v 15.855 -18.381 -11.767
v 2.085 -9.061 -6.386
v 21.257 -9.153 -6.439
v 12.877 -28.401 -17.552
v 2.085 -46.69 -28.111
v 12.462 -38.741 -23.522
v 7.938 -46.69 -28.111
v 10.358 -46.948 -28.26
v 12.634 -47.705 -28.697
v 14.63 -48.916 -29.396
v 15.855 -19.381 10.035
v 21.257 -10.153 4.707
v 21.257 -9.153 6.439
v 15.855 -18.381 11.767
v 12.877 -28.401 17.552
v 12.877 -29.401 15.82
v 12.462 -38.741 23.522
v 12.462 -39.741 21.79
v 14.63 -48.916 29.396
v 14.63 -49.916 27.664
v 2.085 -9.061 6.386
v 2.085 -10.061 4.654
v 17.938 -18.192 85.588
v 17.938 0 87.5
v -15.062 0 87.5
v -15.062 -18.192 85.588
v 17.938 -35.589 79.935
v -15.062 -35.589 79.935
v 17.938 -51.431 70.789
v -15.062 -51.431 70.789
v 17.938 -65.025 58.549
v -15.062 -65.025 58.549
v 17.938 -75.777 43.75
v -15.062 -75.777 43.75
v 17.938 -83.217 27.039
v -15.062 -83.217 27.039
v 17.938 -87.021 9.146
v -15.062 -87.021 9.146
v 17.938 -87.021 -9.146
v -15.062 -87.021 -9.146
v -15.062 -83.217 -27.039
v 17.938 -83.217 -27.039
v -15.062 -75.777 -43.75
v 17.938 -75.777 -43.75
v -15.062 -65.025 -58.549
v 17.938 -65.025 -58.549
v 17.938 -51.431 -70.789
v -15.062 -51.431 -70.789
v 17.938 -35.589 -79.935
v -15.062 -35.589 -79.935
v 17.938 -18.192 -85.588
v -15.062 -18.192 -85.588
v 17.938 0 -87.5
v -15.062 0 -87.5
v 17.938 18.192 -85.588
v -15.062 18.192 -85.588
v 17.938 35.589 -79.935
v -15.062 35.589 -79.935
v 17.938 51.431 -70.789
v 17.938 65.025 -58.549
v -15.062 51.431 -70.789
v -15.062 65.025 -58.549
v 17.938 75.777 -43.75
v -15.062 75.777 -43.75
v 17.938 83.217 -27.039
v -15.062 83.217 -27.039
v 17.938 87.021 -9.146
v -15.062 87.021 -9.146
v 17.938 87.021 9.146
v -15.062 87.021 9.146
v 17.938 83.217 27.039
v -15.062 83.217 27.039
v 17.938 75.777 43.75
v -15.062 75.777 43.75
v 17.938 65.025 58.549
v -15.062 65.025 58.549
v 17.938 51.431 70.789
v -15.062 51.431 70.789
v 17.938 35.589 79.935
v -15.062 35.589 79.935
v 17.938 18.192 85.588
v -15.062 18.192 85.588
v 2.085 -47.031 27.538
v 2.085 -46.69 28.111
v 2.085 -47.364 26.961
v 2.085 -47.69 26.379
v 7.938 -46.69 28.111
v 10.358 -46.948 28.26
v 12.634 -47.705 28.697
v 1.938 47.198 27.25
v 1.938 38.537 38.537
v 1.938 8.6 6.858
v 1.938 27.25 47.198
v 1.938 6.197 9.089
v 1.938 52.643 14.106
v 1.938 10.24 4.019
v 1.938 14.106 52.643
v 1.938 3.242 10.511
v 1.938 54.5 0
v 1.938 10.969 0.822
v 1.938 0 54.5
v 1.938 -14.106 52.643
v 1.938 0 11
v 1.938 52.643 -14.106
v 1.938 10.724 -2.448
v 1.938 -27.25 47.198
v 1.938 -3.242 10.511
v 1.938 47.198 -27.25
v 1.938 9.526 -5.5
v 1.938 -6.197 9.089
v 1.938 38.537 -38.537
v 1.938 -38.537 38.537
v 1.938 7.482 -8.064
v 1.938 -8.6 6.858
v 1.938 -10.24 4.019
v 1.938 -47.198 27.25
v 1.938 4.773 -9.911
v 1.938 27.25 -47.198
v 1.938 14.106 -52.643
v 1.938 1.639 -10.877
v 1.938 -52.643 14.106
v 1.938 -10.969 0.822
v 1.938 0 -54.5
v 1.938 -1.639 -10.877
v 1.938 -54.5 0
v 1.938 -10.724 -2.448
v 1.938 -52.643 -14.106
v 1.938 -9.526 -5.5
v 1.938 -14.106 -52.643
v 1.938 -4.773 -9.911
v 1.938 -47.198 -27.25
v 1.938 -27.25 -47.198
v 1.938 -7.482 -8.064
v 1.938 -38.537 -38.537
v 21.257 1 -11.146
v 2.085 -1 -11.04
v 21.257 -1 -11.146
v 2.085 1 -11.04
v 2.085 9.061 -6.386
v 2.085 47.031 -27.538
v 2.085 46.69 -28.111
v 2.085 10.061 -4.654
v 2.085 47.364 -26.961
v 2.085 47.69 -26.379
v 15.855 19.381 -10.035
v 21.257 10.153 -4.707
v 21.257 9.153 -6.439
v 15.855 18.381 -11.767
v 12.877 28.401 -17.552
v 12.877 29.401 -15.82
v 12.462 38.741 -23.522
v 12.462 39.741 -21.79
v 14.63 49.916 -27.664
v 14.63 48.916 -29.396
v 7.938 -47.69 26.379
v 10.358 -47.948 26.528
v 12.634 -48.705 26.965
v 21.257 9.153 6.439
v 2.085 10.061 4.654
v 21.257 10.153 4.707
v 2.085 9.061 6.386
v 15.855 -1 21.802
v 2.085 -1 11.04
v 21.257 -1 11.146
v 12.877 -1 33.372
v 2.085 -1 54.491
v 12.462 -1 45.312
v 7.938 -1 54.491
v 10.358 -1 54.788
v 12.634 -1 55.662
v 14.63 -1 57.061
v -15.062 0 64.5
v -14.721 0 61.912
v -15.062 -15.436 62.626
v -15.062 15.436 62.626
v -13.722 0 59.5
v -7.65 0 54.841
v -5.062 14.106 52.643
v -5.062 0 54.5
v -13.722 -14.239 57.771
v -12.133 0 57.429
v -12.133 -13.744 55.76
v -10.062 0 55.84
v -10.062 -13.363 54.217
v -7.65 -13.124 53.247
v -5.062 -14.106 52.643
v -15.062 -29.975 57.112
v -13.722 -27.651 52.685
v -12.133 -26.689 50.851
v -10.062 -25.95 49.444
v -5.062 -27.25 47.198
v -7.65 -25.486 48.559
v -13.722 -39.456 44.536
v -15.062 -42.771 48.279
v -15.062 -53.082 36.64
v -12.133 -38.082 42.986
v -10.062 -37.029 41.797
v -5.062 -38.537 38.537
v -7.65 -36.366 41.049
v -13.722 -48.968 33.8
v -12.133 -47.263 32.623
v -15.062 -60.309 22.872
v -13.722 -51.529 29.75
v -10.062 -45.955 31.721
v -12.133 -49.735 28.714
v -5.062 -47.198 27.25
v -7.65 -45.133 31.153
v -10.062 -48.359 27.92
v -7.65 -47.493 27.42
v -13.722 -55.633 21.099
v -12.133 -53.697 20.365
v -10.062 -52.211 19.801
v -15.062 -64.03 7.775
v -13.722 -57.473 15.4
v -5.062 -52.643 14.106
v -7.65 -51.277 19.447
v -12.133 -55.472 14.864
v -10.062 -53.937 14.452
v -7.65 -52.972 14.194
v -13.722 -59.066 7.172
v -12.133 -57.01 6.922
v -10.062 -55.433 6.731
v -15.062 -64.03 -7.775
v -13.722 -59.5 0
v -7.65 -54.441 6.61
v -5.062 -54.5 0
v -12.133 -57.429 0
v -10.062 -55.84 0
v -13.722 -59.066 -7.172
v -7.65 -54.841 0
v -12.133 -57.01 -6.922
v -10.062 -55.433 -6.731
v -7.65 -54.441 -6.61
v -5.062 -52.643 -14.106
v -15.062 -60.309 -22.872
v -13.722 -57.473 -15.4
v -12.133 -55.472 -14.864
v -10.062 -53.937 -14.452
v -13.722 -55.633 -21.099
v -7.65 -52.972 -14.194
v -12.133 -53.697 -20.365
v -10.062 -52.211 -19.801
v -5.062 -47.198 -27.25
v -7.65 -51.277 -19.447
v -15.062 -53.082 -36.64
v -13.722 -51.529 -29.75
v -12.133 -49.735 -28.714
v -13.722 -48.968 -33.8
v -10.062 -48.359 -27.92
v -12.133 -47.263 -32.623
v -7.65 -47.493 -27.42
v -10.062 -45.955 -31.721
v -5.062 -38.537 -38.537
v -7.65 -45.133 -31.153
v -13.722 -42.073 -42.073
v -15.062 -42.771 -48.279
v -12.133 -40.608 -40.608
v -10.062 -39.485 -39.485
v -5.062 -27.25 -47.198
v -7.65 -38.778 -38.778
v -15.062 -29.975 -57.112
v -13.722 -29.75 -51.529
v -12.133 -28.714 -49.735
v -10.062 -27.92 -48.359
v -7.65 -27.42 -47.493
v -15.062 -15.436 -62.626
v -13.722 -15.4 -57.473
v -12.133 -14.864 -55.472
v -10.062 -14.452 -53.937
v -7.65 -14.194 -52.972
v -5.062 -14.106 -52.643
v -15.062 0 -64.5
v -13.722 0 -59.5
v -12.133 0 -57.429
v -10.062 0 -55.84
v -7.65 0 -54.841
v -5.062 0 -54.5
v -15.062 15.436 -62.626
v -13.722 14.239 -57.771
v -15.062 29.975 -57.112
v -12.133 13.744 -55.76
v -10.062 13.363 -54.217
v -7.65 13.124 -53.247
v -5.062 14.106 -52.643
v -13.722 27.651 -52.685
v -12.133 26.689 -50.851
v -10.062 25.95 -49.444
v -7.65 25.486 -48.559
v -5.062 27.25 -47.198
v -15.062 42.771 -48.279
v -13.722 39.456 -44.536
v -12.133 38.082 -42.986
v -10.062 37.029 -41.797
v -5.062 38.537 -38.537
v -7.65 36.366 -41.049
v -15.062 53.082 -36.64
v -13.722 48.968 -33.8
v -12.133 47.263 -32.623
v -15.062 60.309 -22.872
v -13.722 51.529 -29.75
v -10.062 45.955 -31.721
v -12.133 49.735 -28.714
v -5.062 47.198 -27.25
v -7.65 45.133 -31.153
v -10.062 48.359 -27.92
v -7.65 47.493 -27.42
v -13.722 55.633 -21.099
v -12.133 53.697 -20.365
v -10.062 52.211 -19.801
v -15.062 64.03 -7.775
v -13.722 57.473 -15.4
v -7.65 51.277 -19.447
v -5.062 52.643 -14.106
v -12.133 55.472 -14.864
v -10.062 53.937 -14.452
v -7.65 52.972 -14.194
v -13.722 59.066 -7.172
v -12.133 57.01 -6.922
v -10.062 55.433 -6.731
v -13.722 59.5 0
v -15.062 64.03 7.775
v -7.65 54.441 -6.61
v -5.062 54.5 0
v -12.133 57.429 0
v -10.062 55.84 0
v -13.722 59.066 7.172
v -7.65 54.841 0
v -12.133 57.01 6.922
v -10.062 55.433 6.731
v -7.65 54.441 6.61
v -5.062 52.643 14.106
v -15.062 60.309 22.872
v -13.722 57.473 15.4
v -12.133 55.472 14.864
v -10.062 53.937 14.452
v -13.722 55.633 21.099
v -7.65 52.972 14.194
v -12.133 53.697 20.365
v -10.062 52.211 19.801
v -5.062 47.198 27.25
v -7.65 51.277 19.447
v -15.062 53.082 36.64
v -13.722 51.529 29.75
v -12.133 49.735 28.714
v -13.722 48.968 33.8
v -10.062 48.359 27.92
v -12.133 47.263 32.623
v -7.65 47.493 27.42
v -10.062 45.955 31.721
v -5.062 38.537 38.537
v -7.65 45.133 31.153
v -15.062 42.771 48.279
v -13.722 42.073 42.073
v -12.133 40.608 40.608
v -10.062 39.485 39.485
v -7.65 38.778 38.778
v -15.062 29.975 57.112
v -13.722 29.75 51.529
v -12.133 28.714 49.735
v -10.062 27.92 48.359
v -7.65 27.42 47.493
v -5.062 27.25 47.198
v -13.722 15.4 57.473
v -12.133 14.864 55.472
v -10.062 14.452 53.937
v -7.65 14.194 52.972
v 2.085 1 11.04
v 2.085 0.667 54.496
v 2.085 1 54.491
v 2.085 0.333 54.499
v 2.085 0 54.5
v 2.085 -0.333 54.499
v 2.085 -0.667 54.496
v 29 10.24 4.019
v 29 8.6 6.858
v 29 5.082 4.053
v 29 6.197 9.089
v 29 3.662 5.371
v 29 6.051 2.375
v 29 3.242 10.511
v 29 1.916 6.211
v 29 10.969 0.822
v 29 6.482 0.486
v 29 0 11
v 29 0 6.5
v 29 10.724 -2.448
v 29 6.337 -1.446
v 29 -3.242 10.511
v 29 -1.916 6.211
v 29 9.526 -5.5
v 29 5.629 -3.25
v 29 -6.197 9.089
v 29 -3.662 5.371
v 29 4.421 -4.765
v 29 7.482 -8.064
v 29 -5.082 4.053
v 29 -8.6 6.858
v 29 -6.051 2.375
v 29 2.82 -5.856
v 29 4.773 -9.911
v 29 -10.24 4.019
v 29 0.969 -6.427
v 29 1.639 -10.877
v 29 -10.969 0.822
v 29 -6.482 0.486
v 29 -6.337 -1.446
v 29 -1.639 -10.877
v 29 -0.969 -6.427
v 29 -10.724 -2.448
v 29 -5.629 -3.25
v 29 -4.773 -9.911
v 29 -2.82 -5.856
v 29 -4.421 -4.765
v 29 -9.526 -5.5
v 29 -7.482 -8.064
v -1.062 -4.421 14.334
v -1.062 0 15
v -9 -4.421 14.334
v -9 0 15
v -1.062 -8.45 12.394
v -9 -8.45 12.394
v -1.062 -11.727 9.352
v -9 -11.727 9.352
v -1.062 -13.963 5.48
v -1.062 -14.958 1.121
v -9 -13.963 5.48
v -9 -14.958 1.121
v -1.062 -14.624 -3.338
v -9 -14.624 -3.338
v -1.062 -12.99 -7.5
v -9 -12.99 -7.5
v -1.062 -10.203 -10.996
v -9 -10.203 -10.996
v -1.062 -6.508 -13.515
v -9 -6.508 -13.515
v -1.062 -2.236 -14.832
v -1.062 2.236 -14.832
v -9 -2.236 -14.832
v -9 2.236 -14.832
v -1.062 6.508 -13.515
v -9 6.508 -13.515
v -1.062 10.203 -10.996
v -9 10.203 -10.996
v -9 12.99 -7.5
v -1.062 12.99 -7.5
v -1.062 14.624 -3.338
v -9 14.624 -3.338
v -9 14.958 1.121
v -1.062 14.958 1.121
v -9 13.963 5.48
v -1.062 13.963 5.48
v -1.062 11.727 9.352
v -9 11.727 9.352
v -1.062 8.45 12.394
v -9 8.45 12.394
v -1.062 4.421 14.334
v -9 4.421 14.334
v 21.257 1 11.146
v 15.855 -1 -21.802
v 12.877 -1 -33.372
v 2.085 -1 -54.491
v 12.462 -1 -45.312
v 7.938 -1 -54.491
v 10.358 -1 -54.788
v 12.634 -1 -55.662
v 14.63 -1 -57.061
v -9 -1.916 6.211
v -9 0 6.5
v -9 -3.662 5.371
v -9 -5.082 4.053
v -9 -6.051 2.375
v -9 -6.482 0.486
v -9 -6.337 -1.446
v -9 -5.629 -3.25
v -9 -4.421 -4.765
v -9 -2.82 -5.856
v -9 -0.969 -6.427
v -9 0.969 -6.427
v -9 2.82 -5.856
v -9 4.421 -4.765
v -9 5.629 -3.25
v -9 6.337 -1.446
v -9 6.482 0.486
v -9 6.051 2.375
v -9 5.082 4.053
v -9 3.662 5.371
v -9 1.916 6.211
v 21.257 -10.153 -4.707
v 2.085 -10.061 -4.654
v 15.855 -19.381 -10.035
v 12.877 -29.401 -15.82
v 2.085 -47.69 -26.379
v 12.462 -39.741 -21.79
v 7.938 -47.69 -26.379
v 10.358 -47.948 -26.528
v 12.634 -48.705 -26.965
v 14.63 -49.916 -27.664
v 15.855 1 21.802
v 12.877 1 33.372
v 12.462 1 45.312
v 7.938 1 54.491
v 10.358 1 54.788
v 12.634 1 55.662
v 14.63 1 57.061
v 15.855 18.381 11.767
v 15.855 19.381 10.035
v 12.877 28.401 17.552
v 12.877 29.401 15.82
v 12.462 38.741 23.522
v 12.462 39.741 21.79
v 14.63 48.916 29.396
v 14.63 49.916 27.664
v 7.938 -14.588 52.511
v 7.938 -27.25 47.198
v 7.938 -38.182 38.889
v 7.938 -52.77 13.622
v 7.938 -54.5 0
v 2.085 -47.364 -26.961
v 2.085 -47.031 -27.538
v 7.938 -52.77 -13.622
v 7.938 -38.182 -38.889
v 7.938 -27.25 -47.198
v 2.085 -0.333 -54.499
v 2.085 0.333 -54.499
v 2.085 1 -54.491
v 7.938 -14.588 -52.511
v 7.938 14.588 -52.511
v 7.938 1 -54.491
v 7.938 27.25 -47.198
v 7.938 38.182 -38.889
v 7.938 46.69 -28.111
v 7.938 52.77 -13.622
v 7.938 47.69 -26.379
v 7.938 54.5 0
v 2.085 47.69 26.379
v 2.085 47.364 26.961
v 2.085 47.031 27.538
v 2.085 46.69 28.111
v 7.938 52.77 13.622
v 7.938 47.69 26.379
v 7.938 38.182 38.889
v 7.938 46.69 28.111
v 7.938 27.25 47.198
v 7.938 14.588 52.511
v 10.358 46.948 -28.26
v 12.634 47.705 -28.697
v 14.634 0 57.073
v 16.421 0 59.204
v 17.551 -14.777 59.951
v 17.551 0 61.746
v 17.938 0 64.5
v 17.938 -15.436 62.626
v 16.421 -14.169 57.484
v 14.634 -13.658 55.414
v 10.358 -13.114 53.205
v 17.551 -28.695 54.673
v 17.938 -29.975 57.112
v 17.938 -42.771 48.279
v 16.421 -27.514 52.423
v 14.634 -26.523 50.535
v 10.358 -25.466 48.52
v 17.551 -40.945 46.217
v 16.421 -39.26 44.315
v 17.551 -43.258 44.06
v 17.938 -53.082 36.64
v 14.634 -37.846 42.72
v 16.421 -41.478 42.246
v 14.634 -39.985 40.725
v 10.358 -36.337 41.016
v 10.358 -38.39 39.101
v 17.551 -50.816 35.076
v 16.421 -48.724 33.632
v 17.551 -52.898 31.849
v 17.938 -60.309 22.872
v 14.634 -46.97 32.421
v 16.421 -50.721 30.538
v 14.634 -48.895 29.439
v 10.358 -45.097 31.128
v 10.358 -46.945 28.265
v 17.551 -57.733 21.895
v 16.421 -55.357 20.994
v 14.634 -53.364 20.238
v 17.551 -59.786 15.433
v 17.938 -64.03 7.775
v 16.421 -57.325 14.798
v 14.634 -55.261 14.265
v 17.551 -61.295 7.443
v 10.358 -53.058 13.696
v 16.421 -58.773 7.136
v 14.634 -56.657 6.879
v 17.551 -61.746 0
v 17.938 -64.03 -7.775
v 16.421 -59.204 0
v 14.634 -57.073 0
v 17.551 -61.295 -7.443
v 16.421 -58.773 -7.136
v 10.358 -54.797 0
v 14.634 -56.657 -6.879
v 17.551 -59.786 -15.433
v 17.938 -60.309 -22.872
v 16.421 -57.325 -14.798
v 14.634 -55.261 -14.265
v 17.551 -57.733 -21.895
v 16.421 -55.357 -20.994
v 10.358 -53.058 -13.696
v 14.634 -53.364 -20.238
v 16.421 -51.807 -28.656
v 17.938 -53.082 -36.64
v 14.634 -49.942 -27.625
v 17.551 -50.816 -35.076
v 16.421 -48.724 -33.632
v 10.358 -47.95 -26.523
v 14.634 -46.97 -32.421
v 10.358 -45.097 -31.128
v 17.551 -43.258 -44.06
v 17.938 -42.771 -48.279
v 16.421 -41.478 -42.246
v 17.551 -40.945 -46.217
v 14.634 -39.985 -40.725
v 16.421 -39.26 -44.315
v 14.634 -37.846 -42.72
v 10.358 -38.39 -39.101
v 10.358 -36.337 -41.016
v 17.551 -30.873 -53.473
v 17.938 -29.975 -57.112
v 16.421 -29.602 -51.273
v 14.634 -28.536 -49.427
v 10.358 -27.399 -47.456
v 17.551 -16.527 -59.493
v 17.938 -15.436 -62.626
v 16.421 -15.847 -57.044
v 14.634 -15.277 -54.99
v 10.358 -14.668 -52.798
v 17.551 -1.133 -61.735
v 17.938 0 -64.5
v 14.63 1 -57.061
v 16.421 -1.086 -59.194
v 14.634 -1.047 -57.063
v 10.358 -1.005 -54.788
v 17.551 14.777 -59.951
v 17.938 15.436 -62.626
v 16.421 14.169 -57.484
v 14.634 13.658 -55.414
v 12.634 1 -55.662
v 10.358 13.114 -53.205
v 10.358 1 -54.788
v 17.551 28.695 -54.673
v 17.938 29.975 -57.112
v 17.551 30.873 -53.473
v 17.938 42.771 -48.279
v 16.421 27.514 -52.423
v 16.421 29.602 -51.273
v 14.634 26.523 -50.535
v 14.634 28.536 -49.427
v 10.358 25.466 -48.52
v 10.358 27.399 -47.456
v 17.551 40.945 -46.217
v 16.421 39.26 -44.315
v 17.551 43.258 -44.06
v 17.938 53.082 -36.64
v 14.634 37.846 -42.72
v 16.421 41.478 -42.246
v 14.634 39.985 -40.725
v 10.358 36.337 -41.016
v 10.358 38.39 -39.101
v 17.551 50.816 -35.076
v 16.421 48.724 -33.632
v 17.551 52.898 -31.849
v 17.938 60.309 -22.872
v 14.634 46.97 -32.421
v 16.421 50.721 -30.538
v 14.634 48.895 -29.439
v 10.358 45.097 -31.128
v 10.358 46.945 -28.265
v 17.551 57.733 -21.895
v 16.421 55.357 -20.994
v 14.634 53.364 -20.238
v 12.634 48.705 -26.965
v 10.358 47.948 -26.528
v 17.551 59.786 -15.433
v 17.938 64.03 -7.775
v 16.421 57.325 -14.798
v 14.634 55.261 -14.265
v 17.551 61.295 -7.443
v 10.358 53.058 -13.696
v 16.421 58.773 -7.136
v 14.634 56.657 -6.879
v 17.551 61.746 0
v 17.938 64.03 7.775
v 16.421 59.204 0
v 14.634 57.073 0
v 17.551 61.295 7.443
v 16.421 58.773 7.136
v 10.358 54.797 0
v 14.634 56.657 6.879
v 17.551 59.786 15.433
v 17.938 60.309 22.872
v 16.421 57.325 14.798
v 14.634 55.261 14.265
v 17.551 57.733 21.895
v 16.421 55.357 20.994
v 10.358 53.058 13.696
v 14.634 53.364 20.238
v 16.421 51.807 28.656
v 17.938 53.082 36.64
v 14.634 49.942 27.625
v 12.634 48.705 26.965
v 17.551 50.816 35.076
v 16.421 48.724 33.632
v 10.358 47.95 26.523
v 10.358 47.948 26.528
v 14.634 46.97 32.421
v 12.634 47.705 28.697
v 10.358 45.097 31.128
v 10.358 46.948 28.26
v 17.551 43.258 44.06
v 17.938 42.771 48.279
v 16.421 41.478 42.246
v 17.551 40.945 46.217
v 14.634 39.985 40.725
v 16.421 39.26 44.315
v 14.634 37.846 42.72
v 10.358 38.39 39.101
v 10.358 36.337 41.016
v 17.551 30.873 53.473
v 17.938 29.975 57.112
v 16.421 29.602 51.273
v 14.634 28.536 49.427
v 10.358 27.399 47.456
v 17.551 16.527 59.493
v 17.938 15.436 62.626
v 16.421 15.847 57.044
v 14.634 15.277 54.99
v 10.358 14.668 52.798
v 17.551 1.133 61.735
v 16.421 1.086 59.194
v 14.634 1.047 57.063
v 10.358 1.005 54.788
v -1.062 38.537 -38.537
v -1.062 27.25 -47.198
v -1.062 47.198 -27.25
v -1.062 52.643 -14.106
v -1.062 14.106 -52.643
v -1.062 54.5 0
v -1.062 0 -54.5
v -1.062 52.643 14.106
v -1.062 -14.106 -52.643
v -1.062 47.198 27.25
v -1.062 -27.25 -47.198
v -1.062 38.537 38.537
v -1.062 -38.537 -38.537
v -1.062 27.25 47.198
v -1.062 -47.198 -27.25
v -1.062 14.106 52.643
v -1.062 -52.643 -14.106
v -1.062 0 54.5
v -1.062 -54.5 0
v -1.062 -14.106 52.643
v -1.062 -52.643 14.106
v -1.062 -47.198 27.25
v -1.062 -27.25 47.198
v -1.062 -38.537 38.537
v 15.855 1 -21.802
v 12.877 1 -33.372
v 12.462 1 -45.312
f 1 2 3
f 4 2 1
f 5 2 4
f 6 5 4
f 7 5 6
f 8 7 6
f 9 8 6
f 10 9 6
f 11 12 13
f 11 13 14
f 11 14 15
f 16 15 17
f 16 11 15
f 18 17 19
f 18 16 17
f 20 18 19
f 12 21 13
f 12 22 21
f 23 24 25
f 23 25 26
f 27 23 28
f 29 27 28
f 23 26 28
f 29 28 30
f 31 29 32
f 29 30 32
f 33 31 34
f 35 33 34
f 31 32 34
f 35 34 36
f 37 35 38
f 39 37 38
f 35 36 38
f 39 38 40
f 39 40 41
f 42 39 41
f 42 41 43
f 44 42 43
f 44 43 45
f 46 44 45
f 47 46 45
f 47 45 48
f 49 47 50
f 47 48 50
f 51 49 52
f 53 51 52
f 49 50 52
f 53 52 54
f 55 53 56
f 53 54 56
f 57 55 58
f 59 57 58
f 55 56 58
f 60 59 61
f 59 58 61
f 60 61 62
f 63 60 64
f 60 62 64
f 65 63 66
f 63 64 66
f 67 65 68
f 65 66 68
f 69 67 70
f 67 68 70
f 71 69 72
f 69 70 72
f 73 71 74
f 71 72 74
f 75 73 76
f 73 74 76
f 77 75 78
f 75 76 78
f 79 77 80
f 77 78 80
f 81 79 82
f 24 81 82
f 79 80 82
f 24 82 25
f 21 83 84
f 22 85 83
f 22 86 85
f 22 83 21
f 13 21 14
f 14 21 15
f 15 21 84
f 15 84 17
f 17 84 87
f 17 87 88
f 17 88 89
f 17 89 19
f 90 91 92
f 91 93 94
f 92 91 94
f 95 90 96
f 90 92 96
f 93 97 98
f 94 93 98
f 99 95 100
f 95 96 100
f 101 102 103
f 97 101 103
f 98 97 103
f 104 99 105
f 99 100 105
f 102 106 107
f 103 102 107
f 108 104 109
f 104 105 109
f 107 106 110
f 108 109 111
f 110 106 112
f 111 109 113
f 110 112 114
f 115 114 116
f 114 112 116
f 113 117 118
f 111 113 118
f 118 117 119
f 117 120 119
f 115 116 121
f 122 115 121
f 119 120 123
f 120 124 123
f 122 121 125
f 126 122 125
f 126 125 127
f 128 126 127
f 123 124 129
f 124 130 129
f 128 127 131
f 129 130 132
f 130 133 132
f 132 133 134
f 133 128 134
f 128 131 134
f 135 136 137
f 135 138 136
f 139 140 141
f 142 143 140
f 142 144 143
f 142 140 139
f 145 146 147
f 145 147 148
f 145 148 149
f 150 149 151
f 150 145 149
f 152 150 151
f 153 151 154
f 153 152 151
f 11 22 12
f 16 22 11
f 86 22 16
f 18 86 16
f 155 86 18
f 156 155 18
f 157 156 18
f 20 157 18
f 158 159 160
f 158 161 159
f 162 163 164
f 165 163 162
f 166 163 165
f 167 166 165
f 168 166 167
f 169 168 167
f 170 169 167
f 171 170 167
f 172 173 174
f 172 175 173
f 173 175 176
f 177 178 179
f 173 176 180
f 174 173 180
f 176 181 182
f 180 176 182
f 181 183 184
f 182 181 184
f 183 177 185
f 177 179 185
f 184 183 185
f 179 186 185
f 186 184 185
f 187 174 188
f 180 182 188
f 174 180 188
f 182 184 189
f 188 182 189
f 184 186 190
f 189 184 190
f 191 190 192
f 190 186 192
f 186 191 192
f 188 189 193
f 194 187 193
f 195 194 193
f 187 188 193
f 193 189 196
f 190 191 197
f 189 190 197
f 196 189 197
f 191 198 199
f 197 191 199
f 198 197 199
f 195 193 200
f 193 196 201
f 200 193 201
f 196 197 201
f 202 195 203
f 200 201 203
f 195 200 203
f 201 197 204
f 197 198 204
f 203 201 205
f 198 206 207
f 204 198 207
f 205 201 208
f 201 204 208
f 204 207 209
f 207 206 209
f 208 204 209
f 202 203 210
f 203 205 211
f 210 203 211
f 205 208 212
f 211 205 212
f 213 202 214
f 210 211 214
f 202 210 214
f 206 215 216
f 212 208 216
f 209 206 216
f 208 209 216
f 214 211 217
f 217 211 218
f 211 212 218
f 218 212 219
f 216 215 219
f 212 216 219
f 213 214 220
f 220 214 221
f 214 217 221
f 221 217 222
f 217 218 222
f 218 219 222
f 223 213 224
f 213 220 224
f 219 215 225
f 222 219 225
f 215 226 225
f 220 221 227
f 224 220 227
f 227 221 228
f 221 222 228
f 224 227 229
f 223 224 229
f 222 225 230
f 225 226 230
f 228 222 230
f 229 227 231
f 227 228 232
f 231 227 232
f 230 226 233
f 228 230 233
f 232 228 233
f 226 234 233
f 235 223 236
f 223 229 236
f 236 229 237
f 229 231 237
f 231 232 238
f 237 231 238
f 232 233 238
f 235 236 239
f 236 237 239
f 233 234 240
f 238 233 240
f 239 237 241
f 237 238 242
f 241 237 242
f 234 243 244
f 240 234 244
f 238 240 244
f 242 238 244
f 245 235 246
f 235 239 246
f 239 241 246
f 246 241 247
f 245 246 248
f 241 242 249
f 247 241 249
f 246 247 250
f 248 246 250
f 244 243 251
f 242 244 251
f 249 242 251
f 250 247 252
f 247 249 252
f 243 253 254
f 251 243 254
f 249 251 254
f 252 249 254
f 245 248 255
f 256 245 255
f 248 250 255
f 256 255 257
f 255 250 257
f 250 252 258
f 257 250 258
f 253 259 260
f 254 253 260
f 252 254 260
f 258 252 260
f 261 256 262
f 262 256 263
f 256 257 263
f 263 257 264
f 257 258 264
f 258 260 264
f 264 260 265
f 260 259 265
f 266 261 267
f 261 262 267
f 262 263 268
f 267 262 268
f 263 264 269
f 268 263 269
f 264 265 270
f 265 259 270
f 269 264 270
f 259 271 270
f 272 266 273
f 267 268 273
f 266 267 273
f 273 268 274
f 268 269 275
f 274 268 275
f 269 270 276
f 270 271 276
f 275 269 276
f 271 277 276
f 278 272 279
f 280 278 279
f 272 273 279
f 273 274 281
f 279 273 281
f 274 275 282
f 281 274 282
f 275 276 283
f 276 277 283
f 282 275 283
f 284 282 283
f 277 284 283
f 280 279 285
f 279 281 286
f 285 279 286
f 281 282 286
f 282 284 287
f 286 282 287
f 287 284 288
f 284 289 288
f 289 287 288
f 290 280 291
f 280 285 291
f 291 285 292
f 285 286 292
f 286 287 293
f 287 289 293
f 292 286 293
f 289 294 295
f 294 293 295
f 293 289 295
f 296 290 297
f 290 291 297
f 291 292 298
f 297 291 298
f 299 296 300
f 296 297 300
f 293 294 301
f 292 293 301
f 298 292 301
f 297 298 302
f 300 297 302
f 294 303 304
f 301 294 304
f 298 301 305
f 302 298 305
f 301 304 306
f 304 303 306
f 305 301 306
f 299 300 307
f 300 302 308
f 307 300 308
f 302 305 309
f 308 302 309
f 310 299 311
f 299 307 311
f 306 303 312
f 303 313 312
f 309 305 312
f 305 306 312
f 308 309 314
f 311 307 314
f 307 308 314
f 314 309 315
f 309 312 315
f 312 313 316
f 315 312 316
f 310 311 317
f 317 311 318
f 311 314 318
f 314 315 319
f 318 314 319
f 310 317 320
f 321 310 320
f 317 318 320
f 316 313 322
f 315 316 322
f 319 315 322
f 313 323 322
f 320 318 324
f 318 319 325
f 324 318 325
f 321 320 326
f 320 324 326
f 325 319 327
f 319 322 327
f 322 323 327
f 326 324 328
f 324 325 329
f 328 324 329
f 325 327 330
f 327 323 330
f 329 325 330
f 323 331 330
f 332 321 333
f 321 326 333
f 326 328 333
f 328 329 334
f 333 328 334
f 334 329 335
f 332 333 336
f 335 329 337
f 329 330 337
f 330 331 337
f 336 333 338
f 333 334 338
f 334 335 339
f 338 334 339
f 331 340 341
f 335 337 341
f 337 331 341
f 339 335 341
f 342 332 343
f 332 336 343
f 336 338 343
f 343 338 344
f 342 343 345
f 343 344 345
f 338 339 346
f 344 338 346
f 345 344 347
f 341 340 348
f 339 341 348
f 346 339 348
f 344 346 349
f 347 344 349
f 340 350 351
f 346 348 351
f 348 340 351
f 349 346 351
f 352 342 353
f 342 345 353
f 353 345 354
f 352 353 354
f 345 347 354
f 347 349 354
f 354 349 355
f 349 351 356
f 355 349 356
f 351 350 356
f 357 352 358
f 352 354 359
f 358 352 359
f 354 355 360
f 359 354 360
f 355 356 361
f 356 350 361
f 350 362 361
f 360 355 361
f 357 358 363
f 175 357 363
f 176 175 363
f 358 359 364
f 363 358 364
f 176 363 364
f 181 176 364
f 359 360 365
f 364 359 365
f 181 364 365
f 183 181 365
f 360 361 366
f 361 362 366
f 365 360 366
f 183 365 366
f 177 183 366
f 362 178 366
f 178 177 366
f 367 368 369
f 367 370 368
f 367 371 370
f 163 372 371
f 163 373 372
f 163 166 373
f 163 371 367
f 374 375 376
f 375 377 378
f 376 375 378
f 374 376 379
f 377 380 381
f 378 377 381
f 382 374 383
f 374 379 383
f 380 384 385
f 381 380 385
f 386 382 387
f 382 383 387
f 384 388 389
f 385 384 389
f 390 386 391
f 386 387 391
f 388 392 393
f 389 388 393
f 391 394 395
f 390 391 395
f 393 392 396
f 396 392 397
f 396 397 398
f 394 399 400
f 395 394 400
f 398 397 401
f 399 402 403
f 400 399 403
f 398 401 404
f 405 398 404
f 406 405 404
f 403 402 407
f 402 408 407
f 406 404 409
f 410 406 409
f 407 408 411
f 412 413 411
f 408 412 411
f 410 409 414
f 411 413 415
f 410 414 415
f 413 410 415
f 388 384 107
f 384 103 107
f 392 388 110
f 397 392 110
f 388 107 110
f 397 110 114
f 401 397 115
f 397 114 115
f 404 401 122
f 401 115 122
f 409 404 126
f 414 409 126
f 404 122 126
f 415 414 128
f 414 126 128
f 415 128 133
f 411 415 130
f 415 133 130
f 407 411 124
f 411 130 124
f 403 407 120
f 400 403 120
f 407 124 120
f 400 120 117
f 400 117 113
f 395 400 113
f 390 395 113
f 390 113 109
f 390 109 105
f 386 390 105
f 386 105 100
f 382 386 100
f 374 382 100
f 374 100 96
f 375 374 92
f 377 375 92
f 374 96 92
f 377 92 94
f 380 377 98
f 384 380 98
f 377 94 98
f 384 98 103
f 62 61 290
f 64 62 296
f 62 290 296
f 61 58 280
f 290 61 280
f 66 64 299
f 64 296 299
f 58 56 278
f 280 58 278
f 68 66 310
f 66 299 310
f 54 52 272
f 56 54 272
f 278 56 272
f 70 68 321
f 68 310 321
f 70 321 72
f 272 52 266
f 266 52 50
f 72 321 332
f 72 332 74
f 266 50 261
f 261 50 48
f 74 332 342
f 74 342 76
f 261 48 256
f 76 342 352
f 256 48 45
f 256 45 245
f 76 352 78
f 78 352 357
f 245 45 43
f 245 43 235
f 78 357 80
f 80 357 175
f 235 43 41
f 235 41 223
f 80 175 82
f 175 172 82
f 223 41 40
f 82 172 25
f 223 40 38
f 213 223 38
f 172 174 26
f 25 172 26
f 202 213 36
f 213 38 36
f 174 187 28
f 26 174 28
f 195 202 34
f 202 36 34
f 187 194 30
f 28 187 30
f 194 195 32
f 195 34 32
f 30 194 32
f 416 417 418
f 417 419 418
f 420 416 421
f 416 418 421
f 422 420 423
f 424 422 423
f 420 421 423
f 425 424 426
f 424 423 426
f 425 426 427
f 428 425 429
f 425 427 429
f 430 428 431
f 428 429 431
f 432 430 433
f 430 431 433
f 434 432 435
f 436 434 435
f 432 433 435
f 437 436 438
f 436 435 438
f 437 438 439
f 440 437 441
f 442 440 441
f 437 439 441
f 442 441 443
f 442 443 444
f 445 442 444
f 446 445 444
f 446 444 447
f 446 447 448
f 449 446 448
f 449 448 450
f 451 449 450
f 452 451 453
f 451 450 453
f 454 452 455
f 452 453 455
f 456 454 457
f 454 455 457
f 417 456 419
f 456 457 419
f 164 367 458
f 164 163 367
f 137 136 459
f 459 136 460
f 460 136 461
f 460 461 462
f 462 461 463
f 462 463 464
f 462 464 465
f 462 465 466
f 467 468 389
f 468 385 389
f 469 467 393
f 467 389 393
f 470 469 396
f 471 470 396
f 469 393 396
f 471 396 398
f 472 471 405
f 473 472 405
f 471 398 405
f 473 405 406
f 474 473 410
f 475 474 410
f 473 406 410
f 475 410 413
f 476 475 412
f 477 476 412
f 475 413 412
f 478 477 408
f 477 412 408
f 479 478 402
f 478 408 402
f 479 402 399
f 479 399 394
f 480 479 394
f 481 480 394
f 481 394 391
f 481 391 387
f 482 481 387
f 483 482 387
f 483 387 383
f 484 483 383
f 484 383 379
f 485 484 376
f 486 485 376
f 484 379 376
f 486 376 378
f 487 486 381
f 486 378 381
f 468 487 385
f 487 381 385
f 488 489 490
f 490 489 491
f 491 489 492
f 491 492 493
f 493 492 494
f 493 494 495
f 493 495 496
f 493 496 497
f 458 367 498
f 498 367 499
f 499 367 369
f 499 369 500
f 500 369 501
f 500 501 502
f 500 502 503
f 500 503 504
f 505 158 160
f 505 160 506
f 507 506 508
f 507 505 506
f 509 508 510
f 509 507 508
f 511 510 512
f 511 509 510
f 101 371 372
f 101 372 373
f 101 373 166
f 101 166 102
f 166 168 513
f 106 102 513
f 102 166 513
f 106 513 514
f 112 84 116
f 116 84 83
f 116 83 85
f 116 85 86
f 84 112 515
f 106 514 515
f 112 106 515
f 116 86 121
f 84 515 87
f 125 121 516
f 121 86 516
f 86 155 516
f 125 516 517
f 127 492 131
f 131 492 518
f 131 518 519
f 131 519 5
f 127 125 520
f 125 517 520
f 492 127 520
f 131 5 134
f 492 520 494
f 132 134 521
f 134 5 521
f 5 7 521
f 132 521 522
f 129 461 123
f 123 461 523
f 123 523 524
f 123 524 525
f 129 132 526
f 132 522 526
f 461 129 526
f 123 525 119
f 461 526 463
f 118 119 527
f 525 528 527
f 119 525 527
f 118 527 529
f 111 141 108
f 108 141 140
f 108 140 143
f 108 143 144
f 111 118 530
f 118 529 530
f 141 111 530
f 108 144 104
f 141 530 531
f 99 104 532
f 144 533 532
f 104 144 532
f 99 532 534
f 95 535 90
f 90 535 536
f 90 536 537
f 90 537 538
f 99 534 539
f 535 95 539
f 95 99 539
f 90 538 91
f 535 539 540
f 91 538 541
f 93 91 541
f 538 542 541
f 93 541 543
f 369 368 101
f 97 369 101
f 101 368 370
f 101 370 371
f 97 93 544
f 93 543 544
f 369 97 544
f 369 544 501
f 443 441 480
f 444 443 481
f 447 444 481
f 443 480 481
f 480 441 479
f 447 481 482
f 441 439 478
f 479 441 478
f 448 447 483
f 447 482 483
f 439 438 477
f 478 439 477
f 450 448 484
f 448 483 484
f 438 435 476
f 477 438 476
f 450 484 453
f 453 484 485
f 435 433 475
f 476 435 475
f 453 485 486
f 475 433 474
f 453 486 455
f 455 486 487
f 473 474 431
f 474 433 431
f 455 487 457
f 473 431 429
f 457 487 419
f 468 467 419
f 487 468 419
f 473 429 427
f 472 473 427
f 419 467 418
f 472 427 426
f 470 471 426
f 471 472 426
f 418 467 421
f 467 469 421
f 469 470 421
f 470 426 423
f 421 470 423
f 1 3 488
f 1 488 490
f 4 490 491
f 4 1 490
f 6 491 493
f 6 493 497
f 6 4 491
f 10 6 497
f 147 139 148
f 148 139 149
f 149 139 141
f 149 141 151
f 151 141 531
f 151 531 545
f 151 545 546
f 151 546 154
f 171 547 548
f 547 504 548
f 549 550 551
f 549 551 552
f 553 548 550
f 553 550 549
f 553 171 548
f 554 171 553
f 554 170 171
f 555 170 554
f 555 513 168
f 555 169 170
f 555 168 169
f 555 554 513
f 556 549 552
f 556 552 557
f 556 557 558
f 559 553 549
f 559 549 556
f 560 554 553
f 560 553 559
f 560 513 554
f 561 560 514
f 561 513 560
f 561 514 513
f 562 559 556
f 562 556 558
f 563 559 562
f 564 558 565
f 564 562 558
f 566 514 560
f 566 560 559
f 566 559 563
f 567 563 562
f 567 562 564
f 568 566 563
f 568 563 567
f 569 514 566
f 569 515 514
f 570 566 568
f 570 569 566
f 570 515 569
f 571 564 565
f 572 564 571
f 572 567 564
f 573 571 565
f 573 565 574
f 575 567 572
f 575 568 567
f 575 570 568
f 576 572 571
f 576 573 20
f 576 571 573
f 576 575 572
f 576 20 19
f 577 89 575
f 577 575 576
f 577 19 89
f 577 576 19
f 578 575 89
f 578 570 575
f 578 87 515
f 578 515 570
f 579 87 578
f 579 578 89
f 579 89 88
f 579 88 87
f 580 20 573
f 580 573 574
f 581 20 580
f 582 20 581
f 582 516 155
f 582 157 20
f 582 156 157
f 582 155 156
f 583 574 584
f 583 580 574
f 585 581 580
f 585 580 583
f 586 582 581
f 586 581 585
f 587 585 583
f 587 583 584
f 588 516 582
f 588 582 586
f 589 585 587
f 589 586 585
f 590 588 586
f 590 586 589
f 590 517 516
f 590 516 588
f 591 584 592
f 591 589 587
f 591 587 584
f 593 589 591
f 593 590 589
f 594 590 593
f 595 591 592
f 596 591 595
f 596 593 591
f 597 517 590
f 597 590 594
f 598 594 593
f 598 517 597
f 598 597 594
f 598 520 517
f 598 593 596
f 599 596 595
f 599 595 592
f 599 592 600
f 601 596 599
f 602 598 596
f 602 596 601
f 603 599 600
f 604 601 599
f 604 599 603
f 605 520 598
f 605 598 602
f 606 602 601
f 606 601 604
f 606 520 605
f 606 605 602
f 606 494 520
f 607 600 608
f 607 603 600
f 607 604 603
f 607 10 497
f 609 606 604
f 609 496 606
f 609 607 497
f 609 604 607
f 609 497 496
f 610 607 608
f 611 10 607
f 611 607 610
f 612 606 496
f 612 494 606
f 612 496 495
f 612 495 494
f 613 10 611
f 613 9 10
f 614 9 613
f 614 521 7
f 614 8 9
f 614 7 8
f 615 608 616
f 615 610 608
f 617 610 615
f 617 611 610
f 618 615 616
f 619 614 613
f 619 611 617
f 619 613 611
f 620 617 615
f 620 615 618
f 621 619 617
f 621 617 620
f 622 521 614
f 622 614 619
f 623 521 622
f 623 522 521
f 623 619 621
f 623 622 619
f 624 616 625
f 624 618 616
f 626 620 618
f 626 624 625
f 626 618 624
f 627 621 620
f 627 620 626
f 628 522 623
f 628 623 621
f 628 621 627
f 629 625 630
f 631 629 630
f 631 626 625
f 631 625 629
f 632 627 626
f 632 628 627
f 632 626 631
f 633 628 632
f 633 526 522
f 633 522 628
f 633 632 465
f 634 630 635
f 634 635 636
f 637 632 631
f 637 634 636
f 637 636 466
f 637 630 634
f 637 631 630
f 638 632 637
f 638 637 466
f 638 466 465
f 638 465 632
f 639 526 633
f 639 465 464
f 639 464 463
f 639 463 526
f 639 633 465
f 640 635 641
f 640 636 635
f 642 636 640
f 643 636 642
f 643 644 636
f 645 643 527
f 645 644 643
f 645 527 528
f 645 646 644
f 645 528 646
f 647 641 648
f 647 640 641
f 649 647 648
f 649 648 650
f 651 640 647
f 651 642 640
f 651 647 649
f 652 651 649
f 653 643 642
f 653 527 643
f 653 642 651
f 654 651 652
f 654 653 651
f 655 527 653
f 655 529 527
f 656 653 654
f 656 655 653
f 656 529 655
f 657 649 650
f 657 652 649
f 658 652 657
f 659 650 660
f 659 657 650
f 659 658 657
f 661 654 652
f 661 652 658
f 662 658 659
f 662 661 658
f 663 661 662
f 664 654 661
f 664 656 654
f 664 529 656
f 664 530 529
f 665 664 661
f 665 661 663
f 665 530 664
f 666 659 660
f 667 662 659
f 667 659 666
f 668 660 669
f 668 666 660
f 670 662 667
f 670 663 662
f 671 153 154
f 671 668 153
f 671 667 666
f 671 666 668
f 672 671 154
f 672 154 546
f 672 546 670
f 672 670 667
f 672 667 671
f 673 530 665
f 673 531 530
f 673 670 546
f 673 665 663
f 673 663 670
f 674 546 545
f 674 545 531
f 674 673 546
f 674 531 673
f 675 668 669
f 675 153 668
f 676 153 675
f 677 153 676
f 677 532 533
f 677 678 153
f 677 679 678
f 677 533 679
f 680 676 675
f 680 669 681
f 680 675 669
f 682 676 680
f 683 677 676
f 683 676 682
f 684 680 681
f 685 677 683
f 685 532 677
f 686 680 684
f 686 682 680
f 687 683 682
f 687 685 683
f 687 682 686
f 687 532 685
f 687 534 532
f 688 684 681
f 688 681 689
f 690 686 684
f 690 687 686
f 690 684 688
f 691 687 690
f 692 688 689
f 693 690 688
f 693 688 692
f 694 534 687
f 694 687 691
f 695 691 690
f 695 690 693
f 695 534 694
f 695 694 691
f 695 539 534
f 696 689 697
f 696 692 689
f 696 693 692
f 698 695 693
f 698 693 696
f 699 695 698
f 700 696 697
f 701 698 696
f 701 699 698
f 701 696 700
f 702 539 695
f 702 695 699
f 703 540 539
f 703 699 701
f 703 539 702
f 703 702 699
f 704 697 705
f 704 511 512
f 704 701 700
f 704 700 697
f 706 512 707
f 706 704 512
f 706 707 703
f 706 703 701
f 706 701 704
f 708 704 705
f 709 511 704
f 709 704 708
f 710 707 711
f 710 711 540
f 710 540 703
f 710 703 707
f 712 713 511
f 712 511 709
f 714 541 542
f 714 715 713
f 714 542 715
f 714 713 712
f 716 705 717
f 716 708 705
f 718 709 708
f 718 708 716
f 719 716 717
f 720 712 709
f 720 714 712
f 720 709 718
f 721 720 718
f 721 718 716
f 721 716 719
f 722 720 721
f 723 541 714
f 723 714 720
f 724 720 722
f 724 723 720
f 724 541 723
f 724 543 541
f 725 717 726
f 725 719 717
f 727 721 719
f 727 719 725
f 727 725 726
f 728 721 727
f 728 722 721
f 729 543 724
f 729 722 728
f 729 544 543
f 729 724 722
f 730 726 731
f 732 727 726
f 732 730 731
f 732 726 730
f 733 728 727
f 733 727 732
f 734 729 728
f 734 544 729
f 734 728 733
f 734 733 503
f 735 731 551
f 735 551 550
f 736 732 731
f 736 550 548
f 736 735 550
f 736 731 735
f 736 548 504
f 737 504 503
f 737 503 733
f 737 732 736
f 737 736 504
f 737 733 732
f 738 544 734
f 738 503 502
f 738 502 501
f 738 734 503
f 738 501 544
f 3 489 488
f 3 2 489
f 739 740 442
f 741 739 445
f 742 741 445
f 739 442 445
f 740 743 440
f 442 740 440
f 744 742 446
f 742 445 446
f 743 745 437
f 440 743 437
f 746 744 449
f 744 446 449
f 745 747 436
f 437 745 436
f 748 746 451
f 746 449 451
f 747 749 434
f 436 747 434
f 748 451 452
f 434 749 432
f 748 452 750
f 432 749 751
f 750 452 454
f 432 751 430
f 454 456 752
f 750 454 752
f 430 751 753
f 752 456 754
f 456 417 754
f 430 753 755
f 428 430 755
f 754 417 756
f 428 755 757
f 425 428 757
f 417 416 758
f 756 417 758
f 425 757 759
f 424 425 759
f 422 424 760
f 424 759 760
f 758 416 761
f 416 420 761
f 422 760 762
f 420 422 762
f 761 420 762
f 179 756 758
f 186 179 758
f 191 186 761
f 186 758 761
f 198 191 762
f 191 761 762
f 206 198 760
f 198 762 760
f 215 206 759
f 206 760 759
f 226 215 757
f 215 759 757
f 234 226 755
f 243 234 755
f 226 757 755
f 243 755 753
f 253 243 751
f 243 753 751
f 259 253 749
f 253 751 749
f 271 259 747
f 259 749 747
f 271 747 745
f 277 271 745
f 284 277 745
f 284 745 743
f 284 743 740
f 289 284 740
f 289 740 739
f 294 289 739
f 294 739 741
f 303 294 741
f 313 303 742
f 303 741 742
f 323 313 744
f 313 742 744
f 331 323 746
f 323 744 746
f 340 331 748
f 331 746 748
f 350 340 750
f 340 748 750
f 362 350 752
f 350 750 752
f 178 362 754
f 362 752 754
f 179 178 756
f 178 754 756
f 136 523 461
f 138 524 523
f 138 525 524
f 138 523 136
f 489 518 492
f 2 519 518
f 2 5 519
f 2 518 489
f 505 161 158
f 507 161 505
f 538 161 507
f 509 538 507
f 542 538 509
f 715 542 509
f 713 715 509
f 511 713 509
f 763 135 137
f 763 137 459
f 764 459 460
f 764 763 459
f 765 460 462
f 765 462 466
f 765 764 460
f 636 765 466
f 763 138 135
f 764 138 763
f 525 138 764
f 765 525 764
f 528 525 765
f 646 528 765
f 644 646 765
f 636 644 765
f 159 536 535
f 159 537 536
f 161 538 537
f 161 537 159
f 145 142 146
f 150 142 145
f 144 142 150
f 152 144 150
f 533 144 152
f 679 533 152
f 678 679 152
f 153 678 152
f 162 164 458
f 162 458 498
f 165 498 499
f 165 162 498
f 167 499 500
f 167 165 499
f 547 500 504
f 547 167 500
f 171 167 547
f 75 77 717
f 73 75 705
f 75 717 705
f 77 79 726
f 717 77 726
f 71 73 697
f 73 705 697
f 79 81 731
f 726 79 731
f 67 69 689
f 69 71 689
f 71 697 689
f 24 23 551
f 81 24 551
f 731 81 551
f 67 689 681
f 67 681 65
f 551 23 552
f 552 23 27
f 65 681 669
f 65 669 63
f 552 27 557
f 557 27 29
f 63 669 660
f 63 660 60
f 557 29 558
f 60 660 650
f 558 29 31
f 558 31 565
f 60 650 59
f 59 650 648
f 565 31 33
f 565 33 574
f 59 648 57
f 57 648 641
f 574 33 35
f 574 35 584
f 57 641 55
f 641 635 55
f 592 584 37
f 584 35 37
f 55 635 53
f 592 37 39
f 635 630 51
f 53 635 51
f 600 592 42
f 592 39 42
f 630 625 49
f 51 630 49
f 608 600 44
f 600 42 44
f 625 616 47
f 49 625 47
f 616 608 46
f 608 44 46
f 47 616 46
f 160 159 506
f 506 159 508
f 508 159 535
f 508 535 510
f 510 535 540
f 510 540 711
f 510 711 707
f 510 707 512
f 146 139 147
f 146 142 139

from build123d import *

# Parameters (mm, degrees)
F3_R            = 10
F5_DEPTH        = 1
F5_COPIES_COUNT = 6


# Not quite as in the source:
# - a pattern or mirror of a feature is missing from the dataset's text; its kind, count and spacing are read off the source's solid


with BuildPart() as f2:
    # F1 (on Front) → F2 (revolve)
    with BuildSketch(Plane.XZ):
        Polygon((17.9380366504, 54.5), (17.9380366504, 87.5), (-15.0619633496, 87.5), (-15.0619633496, 54.5), (-1.0619633496, 54.5), (-1.0619633496, 15), (-9, 15), (-9, 6.5), (29, 6.5), (29, 11), (1.9380366504, 11), (1.9380366504, 54.5), align=None)
    revolve(axis=Axis((-1.7091594636, 0, 0), (1, 0, 0)))

    # F3
    f3_edges = [f2.edges().sort_by_distance(p)[0] for p in [
        (17.938037, 0, -54.5),
        (-15.061963, 0, -54.5),
    ]]
    fillet(f3_edges, radius=F3_R)

    # F4 (on Front) → F5 (join, symmetric)
    with BuildSketch(Plane.XZ):
        with BuildLine():
            ThreePointArc((21.256512031, 11.1461849883), (12.8744275284, 33.3890012192), (14.6401561797, 57.0931024849))
            Line((14.6401561797, 57.0931024849), (2.0852813032, 57.0931024849))
            Line((2.0852813032, 57.0931024849), (2.0852813032, 11.0397199169))
            Line((2.0852813032, 11.0397199169), (21.256512031, 11.1461849883))
        make_face()
    f5 = extrude(amount=F5_DEPTH, both=True)

    # F5_copies: F5 ×6 about axis
    f5_copies_axis = Axis((0, 0, 0), (1, 0, 0))
    for i in range(1, F5_COPIES_COUNT):
        add(f5.rotate(f5_copies_axis, i * 360 / F5_COPIES_COUNT))


solid = f2.part
